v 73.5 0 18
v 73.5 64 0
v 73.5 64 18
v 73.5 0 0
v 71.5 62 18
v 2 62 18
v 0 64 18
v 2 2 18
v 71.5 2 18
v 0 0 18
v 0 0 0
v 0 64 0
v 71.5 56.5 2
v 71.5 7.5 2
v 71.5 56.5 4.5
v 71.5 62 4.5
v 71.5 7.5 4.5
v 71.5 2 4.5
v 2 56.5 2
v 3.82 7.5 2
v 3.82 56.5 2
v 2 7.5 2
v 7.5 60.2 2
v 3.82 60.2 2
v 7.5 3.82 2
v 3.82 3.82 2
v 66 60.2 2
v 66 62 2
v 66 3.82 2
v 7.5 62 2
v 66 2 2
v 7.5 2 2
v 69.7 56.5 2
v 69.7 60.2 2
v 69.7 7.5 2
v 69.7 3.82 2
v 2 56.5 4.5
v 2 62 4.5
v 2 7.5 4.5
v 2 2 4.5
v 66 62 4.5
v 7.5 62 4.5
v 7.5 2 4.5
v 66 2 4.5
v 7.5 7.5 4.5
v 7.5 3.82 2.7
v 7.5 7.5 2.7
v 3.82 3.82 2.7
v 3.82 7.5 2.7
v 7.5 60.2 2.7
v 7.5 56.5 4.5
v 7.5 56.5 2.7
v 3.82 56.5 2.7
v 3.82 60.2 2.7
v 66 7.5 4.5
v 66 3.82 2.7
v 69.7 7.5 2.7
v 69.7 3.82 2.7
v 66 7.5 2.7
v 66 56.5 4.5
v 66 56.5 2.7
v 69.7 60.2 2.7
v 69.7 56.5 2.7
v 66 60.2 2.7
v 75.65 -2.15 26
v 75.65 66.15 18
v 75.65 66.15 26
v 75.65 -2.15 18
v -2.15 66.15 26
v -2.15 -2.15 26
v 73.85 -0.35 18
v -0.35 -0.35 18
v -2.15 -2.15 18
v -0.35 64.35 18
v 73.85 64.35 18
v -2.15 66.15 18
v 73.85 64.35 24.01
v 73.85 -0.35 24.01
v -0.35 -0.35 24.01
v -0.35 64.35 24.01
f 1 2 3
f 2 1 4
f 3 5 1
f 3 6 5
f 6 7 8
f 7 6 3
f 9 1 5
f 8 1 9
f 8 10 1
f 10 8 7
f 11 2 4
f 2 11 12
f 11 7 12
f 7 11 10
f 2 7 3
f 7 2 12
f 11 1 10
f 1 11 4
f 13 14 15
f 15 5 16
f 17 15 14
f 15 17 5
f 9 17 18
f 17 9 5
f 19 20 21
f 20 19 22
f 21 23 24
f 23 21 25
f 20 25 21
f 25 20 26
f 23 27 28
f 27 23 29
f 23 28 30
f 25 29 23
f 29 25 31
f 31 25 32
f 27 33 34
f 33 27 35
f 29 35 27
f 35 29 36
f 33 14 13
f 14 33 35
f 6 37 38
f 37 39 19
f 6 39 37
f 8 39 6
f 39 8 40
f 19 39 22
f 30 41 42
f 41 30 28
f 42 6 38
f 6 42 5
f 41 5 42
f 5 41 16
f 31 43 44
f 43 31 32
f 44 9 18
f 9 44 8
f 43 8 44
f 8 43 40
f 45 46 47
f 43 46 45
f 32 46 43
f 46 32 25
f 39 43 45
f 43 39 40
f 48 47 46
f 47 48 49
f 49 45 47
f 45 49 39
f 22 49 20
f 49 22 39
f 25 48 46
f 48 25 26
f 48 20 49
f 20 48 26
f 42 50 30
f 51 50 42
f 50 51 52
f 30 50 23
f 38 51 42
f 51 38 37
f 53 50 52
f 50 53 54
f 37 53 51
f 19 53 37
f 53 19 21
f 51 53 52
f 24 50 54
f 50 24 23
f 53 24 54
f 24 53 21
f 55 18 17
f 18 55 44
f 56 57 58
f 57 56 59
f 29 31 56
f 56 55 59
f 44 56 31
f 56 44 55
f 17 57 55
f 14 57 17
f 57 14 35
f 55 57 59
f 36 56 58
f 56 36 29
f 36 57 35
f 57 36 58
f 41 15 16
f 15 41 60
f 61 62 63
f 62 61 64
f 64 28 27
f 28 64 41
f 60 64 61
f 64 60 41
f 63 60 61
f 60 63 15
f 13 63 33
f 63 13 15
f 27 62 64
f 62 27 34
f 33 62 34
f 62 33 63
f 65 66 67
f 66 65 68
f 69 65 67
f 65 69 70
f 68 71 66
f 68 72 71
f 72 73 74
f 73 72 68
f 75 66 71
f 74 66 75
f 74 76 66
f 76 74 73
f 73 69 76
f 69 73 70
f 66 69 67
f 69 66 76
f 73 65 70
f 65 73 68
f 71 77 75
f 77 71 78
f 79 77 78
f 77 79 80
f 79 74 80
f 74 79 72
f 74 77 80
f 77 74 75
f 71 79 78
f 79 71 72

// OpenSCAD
// Starbie Shell — Week 2 enclosure concept
// Units: millimetres. Board coordinates are translated so the outline's
// lower-left corner (-4, 0.5) maps to enclosure-local (0, 0).

// PCB dimensions measured from the four KiCad Edge.Cuts segments.
pcb_width = 68.5;
pcb_depth = 59.0;
pcb_thickness = 1.6;

// Fit and construction parameters. Adjust these after measuring the real PCB
// and chosen printer/material; they are starting values, not validated fits.
board_side_clearance = 0.5;  // cavity clearance at each board edge
wall_thickness = 2.0;
base_floor_thickness = 2.0;
base_wall_height = 16.0;
corner_ledge_width = 5.5;
corner_ledge_depth = 5.5;
ledge_thickness = 1.8;      // vertical thickness of the PCB bearing shelf
support_web_thickness = 1.8; // lower ribs joining each shelf to both walls
board_bottom_height = 4.5;   // board underside above the outside bottom

lid_top_thickness = 2.0;
lid_skirt_height = 6.0;
lid_wall_thickness = 1.8;
lid_fit_clearance = 0.35;   // per side around base exterior

// Select "assembly", "base", or "lid" for preview/export.
part = "assembly";

cavity_width = pcb_width + 2 * board_side_clearance;
cavity_depth = pcb_depth + 2 * board_side_clearance;
outer_width = cavity_width + 2 * wall_thickness;
outer_depth = cavity_depth + 2 * wall_thickness;
base_height = base_floor_thickness + base_wall_height;

// Base centered about the PCB outline. Each corner shelf bears the PCB at
// board_bottom_height. Two lower ribs connect each shelf to the adjacent cavity
// walls and floor, so none of the supports are floating print islands.
module base() {
    difference() {
        cube([outer_width, outer_depth, base_height]);
        translate([wall_thickness, wall_thickness, base_floor_thickness])
            cube([cavity_width, cavity_depth, base_wall_height + 0.02]);
    }

    shelf_bottom = board_bottom_height - ledge_thickness;
    rib_bottom = base_floor_thickness - 0.02; // overlap floor for a robust union
    rib_height = shelf_bottom - rib_bottom + 0.02;
    wall_overlap = 0.02; // overlap the cavity walls to avoid face-only contact

    for (x_side = [0, 1])
        for (y_side = [0, 1]) {
            x = wall_thickness + (x_side ? cavity_width - corner_ledge_width : 0);
            y = wall_thickness + (y_side ? cavity_depth - corner_ledge_depth : 0);

            // Bearing shelf: its upper face is exactly the intended PCB underside height.
            translate([x - (x_side ? 0 : wall_overlap),
                       y - (y_side ? 0 : wall_overlap), shelf_bottom])
                cube([corner_ledge_width + wall_overlap,
                      corner_ledge_depth + wall_overlap, ledge_thickness]);

            // Rib along the X-adjacent wall and rib along the Y-adjacent wall.
            // Together they form a connected L beneath each corner shelf.
            translate([x - (x_side ? 0 : wall_overlap),
                       y + (y_side ? corner_ledge_depth - support_web_thickness : 0),
                       rib_bottom])
                cube([corner_ledge_width + wall_overlap,
                      support_web_thickness + wall_overlap, rib_height]);
            translate([x + (x_side ? corner_ledge_width - support_web_thickness : 0),
                       y - (y_side ? 0 : wall_overlap), rib_bottom])
                cube([support_web_thickness + wall_overlap,
                      corner_ledge_depth + wall_overlap, rib_height]);
        }
}

// A shallow cap with an open skirt slides over the outside of the base.
// No connector, sensor, button, or mounting-hole openings are assumed.
module lid(z_offset = base_height) {
    lid_outer_width = outer_width + 2 * (lid_wall_thickness + lid_fit_clearance);
    lid_outer_depth = outer_depth + 2 * (lid_wall_thickness + lid_fit_clearance);
    translate([-lid_wall_thickness - lid_fit_clearance,
               -lid_wall_thickness - lid_fit_clearance,
               z_offset])
        difference() {
            cube([lid_outer_width, lid_outer_depth,
                  lid_skirt_height + lid_top_thickness]);
            translate([lid_wall_thickness, lid_wall_thickness, -0.01])
                cube([outer_width + 2 * lid_fit_clearance,
                      outer_depth + 2 * lid_fit_clearance,
                      lid_skirt_height + 0.02]);
        }
}

if (part == "base") {
    base();
} else if (part == "lid") {
    lid(0);
} else {
    base();
    lid();
}
